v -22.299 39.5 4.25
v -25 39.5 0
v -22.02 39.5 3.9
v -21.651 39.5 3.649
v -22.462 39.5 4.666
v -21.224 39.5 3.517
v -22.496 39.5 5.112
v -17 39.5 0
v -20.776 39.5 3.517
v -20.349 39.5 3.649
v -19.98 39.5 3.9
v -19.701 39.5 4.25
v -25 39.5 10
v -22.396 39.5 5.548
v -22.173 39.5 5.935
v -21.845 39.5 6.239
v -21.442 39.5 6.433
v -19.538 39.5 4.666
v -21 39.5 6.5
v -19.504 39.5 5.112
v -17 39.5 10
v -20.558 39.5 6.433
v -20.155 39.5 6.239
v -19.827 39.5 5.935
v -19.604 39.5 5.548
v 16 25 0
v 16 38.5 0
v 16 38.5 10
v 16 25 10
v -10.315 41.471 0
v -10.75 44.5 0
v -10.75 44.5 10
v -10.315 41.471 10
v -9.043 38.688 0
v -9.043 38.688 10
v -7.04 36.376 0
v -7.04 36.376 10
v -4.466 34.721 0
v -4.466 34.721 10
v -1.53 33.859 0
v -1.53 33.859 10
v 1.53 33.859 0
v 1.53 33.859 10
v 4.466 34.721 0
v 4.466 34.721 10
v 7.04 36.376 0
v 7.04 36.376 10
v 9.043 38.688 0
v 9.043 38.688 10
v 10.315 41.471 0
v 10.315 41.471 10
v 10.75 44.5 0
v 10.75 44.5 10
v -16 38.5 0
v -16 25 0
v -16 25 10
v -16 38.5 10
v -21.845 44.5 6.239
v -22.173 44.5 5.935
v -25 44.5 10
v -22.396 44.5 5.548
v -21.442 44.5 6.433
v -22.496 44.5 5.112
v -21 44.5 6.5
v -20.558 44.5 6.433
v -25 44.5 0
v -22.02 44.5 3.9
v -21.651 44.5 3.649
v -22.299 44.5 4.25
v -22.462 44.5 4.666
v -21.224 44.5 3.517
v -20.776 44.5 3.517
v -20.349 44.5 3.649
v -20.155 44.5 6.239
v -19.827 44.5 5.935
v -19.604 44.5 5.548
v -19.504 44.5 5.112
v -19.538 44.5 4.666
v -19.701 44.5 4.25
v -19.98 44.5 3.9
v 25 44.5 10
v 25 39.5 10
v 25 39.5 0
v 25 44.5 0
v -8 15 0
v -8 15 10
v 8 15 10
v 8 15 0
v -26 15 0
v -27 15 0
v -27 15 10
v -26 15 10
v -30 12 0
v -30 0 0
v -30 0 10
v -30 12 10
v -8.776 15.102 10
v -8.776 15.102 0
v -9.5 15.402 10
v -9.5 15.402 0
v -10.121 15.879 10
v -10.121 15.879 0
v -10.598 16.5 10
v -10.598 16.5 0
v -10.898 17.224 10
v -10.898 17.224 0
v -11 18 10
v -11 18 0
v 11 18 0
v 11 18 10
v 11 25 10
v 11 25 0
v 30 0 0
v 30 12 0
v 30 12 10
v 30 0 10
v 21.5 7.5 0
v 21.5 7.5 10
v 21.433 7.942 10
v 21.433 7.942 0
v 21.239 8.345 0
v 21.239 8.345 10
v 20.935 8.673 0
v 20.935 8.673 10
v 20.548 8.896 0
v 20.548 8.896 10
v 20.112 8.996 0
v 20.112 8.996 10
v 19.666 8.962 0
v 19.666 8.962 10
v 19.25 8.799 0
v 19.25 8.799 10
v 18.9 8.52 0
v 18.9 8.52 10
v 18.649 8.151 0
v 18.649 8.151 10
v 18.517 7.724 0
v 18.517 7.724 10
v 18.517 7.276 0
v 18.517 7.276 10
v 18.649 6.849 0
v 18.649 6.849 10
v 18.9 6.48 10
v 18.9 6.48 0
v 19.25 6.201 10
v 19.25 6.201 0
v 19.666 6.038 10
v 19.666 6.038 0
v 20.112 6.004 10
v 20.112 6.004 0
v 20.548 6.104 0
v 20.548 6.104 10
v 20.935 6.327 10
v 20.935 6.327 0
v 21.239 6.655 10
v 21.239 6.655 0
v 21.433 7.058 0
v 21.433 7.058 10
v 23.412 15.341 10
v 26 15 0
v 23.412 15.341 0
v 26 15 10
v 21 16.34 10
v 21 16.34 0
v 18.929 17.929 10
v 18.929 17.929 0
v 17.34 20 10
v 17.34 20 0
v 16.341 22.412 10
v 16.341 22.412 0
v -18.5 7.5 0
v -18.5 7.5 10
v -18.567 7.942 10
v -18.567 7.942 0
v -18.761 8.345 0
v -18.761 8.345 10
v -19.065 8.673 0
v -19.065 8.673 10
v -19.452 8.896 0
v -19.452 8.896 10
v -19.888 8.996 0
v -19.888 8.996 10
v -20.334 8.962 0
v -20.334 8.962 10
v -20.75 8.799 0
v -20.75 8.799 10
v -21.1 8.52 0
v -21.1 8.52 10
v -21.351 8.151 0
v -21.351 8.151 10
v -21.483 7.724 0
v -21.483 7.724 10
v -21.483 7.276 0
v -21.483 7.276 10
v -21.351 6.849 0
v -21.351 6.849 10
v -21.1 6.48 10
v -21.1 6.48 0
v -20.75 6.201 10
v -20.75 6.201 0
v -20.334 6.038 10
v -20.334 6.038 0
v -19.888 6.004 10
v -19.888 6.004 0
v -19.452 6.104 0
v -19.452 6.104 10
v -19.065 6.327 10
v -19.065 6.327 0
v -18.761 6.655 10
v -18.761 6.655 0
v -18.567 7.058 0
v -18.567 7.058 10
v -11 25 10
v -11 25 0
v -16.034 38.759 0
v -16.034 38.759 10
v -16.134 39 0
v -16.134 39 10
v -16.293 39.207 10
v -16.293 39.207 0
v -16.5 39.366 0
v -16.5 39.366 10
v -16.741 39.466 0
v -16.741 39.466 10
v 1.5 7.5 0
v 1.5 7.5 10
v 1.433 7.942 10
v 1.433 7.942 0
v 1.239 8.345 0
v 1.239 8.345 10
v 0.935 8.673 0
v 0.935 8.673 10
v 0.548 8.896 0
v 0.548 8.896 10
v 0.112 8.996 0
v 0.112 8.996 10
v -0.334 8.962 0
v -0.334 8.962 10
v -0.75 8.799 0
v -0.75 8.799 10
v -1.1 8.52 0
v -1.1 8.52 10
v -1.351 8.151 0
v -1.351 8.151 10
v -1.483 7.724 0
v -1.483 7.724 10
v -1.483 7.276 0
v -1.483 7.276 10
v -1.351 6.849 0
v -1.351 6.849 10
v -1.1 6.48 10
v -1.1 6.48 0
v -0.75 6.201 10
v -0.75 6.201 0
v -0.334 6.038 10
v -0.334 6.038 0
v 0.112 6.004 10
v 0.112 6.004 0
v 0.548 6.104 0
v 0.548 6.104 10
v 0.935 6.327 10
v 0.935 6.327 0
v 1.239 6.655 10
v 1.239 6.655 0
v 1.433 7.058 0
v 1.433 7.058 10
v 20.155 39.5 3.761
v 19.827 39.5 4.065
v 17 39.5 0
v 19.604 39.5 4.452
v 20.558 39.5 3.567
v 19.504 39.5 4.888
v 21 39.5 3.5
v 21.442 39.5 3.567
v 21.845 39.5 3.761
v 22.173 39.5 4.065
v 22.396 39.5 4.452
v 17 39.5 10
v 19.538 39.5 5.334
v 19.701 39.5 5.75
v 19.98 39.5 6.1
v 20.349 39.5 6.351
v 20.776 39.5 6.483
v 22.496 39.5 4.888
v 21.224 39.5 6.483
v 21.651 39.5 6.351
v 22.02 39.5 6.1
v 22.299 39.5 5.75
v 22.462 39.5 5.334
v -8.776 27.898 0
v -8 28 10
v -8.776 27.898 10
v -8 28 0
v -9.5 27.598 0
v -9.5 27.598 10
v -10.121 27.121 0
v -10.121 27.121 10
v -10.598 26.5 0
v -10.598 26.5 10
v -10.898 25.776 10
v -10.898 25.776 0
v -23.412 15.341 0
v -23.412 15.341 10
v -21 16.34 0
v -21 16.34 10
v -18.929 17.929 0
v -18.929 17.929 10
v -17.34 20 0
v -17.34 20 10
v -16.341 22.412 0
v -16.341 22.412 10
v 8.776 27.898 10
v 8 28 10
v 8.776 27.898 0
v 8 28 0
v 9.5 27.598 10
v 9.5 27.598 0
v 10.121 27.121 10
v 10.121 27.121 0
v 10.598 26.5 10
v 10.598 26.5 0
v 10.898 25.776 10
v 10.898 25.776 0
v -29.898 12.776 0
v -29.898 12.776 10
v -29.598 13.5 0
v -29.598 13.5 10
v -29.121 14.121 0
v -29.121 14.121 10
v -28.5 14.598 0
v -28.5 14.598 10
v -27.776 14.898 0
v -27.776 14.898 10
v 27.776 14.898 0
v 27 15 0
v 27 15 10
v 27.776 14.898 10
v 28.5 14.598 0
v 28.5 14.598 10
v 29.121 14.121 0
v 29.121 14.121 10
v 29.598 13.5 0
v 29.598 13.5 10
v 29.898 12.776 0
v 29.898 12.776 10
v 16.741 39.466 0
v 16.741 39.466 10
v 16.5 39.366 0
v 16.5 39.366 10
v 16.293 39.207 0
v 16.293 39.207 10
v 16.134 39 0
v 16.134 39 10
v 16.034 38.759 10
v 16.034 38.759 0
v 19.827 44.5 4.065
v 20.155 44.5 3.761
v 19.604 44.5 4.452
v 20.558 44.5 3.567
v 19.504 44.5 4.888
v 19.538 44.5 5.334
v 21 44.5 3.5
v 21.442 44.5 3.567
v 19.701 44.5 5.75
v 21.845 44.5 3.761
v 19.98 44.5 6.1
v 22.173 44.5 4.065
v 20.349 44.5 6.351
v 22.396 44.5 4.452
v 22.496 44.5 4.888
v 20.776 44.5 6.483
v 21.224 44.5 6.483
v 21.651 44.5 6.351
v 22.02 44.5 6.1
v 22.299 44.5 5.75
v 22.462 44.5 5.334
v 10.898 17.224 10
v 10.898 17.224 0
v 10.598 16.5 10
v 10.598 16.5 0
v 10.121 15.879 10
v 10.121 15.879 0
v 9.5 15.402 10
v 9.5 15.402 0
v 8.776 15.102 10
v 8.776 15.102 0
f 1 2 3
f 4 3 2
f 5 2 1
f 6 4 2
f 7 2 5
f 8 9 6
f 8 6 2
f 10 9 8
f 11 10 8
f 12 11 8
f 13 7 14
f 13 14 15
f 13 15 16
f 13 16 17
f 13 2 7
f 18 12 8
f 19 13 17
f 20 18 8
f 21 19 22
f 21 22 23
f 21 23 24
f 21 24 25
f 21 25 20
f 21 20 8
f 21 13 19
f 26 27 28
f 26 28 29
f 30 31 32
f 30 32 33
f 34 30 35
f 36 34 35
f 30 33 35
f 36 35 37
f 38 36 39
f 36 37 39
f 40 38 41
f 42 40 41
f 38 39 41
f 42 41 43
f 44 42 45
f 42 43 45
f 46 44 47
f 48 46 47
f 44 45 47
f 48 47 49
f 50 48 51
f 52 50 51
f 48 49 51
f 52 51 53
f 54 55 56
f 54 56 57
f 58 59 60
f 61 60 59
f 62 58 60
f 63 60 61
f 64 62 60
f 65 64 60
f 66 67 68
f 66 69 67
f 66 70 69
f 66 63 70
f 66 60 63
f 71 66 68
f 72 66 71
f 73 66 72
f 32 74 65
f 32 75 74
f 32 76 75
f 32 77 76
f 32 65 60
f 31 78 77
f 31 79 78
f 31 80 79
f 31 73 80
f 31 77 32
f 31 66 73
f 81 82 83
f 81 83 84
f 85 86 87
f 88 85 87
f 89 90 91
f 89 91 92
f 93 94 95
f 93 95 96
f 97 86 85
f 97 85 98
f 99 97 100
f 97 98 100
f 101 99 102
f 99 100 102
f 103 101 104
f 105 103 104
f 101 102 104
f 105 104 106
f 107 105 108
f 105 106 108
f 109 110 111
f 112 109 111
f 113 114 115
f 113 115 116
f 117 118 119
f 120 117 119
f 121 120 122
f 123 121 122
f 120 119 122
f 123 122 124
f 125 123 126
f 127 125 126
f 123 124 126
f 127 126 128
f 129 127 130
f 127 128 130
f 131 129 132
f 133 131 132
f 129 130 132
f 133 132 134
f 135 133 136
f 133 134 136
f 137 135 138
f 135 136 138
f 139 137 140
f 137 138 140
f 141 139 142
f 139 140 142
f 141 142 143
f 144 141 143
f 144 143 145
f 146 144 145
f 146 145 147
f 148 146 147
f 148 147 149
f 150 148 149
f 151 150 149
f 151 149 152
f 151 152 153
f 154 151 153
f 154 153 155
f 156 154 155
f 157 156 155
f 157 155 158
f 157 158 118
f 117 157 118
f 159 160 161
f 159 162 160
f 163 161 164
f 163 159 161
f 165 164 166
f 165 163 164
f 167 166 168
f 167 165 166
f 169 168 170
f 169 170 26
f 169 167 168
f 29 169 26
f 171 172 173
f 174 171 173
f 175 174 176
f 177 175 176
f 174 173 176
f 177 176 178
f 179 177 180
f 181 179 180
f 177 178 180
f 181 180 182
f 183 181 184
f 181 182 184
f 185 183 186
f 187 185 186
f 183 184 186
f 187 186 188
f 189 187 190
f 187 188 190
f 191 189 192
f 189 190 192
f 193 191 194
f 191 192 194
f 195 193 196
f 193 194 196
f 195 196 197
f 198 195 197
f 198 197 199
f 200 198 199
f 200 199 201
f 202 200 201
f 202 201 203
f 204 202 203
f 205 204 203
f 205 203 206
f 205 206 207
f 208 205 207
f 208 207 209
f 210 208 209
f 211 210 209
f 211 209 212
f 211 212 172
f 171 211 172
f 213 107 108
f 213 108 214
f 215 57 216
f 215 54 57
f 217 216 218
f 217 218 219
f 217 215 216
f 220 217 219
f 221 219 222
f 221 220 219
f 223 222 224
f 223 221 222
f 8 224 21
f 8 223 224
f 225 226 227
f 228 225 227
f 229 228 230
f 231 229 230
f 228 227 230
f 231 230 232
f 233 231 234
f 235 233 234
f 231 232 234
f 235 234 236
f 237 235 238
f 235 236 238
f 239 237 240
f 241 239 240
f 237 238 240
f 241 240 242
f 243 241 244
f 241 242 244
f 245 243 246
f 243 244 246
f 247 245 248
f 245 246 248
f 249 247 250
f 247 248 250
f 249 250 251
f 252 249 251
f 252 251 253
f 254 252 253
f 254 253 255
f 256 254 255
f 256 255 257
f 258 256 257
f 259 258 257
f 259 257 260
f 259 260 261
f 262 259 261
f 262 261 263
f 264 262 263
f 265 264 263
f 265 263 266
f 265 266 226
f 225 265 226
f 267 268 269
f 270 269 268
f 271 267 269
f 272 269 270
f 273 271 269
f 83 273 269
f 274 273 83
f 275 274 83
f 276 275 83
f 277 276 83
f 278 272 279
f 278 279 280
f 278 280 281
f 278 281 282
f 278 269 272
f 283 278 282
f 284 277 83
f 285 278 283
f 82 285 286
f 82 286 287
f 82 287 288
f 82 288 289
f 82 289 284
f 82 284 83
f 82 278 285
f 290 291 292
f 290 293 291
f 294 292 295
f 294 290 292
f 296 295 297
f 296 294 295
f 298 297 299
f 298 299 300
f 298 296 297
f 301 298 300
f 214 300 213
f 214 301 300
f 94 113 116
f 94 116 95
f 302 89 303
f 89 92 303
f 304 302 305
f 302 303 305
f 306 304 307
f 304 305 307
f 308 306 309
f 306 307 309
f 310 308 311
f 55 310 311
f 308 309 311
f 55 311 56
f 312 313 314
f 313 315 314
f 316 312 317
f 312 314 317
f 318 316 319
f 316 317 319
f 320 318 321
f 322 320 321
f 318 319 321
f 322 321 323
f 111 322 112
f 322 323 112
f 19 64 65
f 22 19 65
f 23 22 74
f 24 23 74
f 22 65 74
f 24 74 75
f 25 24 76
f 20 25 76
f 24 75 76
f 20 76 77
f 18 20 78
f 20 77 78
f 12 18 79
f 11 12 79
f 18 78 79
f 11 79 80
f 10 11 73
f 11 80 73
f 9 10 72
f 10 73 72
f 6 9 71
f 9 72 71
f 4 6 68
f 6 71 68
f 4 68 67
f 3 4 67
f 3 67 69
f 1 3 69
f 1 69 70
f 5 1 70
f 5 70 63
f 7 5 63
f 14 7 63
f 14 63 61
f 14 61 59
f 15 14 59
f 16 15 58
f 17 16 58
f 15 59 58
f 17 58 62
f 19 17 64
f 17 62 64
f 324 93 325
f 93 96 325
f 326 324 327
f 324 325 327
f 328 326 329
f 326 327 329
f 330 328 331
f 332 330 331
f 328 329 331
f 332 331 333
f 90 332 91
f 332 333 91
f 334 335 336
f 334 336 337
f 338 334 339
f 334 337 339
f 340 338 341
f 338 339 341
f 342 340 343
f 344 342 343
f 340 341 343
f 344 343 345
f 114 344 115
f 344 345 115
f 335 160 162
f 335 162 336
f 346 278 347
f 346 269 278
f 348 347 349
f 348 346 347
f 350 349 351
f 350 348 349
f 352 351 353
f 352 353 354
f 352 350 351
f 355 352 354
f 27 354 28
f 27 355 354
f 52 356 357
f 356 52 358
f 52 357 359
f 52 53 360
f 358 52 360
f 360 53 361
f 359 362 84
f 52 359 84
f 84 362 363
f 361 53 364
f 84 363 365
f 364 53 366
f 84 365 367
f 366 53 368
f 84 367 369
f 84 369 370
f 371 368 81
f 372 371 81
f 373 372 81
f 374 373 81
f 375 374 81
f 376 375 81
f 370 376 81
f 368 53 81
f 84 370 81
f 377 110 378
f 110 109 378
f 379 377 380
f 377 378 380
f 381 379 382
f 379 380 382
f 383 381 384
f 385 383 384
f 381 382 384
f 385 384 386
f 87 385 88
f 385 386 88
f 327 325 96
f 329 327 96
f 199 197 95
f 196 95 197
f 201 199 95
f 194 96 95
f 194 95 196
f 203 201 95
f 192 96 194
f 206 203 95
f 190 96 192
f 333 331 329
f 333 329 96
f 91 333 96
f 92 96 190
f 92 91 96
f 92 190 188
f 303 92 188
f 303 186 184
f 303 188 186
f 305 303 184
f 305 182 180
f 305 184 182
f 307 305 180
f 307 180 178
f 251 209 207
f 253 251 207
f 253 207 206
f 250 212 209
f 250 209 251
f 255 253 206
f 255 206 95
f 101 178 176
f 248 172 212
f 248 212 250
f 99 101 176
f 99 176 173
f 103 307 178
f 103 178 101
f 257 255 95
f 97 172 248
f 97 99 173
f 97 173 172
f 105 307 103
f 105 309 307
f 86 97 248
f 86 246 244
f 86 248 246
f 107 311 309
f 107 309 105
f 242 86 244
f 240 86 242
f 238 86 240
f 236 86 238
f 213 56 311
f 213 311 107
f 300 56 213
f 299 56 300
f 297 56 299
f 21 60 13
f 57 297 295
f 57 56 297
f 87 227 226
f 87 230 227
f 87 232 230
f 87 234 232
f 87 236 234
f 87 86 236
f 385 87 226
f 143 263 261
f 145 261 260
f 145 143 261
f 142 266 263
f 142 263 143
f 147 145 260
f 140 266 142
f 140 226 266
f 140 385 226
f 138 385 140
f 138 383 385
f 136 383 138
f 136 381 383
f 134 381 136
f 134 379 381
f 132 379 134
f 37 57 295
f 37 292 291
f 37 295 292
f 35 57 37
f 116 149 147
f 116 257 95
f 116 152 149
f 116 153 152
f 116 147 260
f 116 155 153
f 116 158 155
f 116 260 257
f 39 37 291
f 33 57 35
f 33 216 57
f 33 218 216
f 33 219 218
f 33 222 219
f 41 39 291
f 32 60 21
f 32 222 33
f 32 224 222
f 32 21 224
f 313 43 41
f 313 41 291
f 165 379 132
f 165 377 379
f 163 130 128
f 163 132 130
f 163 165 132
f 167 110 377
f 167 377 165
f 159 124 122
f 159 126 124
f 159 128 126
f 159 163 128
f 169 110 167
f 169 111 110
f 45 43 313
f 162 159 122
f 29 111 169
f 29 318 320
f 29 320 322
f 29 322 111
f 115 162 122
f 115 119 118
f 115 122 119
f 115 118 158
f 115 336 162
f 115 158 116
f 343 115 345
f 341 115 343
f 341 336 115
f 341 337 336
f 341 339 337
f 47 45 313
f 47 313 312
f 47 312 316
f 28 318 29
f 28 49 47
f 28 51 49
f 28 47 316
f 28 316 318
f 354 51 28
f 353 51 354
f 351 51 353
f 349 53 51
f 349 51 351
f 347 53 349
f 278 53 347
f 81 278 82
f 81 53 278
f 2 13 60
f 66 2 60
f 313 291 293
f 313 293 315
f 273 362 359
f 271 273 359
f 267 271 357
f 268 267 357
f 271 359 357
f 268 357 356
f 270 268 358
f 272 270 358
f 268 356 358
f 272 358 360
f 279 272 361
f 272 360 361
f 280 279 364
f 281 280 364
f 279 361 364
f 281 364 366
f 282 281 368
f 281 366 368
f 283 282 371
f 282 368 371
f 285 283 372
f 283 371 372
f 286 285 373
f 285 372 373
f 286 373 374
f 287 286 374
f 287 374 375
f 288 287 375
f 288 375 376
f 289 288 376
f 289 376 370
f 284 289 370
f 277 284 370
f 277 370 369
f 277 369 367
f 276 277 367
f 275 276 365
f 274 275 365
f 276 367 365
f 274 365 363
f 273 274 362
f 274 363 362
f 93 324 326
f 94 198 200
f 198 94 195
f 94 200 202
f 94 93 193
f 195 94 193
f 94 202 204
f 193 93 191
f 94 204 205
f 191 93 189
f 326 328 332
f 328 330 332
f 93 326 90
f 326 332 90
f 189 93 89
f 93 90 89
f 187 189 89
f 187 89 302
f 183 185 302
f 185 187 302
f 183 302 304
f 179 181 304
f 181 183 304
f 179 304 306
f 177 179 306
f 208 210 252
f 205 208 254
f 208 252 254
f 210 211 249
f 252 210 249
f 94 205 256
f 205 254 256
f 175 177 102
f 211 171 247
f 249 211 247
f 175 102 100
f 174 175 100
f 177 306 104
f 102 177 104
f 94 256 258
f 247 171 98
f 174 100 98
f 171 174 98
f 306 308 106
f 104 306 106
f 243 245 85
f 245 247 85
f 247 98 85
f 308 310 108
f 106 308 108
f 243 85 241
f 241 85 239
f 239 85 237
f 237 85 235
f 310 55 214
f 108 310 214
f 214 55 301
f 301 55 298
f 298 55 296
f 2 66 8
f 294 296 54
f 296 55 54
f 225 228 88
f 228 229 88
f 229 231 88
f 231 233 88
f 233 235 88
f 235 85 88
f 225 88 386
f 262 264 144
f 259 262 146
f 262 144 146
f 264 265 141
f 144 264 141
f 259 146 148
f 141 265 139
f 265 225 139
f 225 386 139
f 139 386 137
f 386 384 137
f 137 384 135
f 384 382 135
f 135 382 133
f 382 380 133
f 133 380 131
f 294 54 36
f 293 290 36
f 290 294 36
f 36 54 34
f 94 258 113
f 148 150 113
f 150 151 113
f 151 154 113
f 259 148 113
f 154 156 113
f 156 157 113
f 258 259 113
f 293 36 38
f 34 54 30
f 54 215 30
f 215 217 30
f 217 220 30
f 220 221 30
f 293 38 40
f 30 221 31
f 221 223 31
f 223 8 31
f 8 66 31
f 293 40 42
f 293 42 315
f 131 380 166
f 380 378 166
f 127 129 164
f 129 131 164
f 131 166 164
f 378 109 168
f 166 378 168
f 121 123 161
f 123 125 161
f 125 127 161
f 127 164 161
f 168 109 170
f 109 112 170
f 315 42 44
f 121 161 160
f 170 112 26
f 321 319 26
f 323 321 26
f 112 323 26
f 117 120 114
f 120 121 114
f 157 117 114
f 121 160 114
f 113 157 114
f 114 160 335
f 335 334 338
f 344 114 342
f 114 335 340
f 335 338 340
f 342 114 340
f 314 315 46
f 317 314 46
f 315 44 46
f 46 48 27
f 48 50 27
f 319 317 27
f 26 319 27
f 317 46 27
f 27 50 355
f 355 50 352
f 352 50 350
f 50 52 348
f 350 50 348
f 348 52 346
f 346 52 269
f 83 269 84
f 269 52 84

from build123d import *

# Parameters (mm, degrees)
EXTRUDE_1_DEPTH     = 10
SKETCH_3_R          = 10.75
CUT_EXTRUDE_1_DEPTH = 55.591666031
SKETCH_4_R          = 1.5
CUT_EXTRUDE_2_DEPTH = 55.591666031
FILLET_1_R          = 10
FILLET_3_R          = 3
SKETCH_7_W          = 22
SKETCH_7_H          = 13
CUT_EXTRUDE_5_DEPTH = 55.591666031
FILLET_4_R          = 3
SKETCH_8_W          = 9
SKETCH_8_H          = 5
EXTRUDE_2_DEPTH     = 10
FILLET_5_R          = 1
SKETCH_9_R          = 1.5
CUT_EXTRUDE_6_DEPTH = 5


with BuildPart() as part:
    # 草图2 → 凸台-拉伸1 (new body)
    with BuildSketch(Plane.XY):
        Polygon((30, 0), (-30, 0), (-30, 15), (-16, 15), (-16, 44.5), (16, 44.5), (16, 15), (30, 15), align=None)
    extrude(amount=EXTRUDE_1_DEPTH)

    # 草图3 → 切除-拉伸1 (cut, through all)
    with BuildSketch(Plane.XY.offset(10)):
        with Locations((0, 44.5)):
            Circle(SKETCH_3_R)
    extrude(amount=-CUT_EXTRUDE_1_DEPTH, mode=Mode.SUBTRACT)

    # 草图4 → 切除-拉伸2 (cut, through all)
    with BuildSketch(Plane.XY.offset(10)):
        with Locations((-20, 7.5)):
            Circle(SKETCH_4_R)
        with Locations((0, 7.5)):
            Circle(SKETCH_4_R)
        with Locations((20, 7.5)):
            Circle(SKETCH_4_R)
    extrude(amount=-CUT_EXTRUDE_2_DEPTH, mode=Mode.SUBTRACT)

    # 圆角1
    fillet_1_edges = [part.edges().sort_by_distance(p)[0] for p in [
        (-16, 15, 5),
        (16, 15, 5),
    ]]
    fillet(fillet_1_edges, radius=FILLET_1_R)

    # 圆角3
    fillet_3_edges = [part.edges().sort_by_distance(p)[0] for p in [
        (-30, 15, 5),
        (30, 15, 5),
    ]]
    fillet(fillet_3_edges, radius=FILLET_3_R)

    # 草图7 → 切除-拉伸5 (cut, through all)
    with BuildSketch(Plane.XY.offset(10)):
        with Locations((0, 21.5)):
            Rectangle(SKETCH_7_W, SKETCH_7_H)
    extrude(amount=-CUT_EXTRUDE_5_DEPTH, mode=Mode.SUBTRACT)

    # 圆角4
    fillet_4_edges = [part.edges().sort_by_distance(p)[0] for p in [
        (11, 28, 5),
        (11, 15, 5),
        (-11, 15, 5),
        (-11, 28, 5),
    ]]
    fillet(fillet_4_edges, radius=FILLET_4_R)

    # 草图8 → 凸台-拉伸2 (add)
    with BuildSketch(Plane.XY.offset(10)):
        with Locations((20.5, 42)):
            Rectangle(SKETCH_8_W, SKETCH_8_H)
        with Locations((-20.5, 42)):
            Rectangle(SKETCH_8_W, SKETCH_8_H)
    extrude(amount=-EXTRUDE_2_DEPTH)

    # 圆角5
    fillet_5_edges = [part.edges().sort_by_distance(p)[0] for p in [
        (-16, 39.5, 5),
        (16, 39.5, 5),
    ]]
    fillet(fillet_5_edges, radius=FILLET_5_R)

    # 草图9 → 切除-拉伸6 (cut)
    with BuildSketch(Plane(origin=(0, 44.5, 0), x_dir=(1, 0, 0), z_dir=(0, 1, 0))):
        with Locations(Location((-21, -5, 0), (0, 0, 270))):
            Circle(SKETCH_9_R)
        with Locations(Location((21, -5, 0), (0, 0, 90))):
            Circle(SKETCH_9_R)
    extrude(amount=-CUT_EXTRUDE_6_DEPTH, mode=Mode.SUBTRACT)


solid = part.part
